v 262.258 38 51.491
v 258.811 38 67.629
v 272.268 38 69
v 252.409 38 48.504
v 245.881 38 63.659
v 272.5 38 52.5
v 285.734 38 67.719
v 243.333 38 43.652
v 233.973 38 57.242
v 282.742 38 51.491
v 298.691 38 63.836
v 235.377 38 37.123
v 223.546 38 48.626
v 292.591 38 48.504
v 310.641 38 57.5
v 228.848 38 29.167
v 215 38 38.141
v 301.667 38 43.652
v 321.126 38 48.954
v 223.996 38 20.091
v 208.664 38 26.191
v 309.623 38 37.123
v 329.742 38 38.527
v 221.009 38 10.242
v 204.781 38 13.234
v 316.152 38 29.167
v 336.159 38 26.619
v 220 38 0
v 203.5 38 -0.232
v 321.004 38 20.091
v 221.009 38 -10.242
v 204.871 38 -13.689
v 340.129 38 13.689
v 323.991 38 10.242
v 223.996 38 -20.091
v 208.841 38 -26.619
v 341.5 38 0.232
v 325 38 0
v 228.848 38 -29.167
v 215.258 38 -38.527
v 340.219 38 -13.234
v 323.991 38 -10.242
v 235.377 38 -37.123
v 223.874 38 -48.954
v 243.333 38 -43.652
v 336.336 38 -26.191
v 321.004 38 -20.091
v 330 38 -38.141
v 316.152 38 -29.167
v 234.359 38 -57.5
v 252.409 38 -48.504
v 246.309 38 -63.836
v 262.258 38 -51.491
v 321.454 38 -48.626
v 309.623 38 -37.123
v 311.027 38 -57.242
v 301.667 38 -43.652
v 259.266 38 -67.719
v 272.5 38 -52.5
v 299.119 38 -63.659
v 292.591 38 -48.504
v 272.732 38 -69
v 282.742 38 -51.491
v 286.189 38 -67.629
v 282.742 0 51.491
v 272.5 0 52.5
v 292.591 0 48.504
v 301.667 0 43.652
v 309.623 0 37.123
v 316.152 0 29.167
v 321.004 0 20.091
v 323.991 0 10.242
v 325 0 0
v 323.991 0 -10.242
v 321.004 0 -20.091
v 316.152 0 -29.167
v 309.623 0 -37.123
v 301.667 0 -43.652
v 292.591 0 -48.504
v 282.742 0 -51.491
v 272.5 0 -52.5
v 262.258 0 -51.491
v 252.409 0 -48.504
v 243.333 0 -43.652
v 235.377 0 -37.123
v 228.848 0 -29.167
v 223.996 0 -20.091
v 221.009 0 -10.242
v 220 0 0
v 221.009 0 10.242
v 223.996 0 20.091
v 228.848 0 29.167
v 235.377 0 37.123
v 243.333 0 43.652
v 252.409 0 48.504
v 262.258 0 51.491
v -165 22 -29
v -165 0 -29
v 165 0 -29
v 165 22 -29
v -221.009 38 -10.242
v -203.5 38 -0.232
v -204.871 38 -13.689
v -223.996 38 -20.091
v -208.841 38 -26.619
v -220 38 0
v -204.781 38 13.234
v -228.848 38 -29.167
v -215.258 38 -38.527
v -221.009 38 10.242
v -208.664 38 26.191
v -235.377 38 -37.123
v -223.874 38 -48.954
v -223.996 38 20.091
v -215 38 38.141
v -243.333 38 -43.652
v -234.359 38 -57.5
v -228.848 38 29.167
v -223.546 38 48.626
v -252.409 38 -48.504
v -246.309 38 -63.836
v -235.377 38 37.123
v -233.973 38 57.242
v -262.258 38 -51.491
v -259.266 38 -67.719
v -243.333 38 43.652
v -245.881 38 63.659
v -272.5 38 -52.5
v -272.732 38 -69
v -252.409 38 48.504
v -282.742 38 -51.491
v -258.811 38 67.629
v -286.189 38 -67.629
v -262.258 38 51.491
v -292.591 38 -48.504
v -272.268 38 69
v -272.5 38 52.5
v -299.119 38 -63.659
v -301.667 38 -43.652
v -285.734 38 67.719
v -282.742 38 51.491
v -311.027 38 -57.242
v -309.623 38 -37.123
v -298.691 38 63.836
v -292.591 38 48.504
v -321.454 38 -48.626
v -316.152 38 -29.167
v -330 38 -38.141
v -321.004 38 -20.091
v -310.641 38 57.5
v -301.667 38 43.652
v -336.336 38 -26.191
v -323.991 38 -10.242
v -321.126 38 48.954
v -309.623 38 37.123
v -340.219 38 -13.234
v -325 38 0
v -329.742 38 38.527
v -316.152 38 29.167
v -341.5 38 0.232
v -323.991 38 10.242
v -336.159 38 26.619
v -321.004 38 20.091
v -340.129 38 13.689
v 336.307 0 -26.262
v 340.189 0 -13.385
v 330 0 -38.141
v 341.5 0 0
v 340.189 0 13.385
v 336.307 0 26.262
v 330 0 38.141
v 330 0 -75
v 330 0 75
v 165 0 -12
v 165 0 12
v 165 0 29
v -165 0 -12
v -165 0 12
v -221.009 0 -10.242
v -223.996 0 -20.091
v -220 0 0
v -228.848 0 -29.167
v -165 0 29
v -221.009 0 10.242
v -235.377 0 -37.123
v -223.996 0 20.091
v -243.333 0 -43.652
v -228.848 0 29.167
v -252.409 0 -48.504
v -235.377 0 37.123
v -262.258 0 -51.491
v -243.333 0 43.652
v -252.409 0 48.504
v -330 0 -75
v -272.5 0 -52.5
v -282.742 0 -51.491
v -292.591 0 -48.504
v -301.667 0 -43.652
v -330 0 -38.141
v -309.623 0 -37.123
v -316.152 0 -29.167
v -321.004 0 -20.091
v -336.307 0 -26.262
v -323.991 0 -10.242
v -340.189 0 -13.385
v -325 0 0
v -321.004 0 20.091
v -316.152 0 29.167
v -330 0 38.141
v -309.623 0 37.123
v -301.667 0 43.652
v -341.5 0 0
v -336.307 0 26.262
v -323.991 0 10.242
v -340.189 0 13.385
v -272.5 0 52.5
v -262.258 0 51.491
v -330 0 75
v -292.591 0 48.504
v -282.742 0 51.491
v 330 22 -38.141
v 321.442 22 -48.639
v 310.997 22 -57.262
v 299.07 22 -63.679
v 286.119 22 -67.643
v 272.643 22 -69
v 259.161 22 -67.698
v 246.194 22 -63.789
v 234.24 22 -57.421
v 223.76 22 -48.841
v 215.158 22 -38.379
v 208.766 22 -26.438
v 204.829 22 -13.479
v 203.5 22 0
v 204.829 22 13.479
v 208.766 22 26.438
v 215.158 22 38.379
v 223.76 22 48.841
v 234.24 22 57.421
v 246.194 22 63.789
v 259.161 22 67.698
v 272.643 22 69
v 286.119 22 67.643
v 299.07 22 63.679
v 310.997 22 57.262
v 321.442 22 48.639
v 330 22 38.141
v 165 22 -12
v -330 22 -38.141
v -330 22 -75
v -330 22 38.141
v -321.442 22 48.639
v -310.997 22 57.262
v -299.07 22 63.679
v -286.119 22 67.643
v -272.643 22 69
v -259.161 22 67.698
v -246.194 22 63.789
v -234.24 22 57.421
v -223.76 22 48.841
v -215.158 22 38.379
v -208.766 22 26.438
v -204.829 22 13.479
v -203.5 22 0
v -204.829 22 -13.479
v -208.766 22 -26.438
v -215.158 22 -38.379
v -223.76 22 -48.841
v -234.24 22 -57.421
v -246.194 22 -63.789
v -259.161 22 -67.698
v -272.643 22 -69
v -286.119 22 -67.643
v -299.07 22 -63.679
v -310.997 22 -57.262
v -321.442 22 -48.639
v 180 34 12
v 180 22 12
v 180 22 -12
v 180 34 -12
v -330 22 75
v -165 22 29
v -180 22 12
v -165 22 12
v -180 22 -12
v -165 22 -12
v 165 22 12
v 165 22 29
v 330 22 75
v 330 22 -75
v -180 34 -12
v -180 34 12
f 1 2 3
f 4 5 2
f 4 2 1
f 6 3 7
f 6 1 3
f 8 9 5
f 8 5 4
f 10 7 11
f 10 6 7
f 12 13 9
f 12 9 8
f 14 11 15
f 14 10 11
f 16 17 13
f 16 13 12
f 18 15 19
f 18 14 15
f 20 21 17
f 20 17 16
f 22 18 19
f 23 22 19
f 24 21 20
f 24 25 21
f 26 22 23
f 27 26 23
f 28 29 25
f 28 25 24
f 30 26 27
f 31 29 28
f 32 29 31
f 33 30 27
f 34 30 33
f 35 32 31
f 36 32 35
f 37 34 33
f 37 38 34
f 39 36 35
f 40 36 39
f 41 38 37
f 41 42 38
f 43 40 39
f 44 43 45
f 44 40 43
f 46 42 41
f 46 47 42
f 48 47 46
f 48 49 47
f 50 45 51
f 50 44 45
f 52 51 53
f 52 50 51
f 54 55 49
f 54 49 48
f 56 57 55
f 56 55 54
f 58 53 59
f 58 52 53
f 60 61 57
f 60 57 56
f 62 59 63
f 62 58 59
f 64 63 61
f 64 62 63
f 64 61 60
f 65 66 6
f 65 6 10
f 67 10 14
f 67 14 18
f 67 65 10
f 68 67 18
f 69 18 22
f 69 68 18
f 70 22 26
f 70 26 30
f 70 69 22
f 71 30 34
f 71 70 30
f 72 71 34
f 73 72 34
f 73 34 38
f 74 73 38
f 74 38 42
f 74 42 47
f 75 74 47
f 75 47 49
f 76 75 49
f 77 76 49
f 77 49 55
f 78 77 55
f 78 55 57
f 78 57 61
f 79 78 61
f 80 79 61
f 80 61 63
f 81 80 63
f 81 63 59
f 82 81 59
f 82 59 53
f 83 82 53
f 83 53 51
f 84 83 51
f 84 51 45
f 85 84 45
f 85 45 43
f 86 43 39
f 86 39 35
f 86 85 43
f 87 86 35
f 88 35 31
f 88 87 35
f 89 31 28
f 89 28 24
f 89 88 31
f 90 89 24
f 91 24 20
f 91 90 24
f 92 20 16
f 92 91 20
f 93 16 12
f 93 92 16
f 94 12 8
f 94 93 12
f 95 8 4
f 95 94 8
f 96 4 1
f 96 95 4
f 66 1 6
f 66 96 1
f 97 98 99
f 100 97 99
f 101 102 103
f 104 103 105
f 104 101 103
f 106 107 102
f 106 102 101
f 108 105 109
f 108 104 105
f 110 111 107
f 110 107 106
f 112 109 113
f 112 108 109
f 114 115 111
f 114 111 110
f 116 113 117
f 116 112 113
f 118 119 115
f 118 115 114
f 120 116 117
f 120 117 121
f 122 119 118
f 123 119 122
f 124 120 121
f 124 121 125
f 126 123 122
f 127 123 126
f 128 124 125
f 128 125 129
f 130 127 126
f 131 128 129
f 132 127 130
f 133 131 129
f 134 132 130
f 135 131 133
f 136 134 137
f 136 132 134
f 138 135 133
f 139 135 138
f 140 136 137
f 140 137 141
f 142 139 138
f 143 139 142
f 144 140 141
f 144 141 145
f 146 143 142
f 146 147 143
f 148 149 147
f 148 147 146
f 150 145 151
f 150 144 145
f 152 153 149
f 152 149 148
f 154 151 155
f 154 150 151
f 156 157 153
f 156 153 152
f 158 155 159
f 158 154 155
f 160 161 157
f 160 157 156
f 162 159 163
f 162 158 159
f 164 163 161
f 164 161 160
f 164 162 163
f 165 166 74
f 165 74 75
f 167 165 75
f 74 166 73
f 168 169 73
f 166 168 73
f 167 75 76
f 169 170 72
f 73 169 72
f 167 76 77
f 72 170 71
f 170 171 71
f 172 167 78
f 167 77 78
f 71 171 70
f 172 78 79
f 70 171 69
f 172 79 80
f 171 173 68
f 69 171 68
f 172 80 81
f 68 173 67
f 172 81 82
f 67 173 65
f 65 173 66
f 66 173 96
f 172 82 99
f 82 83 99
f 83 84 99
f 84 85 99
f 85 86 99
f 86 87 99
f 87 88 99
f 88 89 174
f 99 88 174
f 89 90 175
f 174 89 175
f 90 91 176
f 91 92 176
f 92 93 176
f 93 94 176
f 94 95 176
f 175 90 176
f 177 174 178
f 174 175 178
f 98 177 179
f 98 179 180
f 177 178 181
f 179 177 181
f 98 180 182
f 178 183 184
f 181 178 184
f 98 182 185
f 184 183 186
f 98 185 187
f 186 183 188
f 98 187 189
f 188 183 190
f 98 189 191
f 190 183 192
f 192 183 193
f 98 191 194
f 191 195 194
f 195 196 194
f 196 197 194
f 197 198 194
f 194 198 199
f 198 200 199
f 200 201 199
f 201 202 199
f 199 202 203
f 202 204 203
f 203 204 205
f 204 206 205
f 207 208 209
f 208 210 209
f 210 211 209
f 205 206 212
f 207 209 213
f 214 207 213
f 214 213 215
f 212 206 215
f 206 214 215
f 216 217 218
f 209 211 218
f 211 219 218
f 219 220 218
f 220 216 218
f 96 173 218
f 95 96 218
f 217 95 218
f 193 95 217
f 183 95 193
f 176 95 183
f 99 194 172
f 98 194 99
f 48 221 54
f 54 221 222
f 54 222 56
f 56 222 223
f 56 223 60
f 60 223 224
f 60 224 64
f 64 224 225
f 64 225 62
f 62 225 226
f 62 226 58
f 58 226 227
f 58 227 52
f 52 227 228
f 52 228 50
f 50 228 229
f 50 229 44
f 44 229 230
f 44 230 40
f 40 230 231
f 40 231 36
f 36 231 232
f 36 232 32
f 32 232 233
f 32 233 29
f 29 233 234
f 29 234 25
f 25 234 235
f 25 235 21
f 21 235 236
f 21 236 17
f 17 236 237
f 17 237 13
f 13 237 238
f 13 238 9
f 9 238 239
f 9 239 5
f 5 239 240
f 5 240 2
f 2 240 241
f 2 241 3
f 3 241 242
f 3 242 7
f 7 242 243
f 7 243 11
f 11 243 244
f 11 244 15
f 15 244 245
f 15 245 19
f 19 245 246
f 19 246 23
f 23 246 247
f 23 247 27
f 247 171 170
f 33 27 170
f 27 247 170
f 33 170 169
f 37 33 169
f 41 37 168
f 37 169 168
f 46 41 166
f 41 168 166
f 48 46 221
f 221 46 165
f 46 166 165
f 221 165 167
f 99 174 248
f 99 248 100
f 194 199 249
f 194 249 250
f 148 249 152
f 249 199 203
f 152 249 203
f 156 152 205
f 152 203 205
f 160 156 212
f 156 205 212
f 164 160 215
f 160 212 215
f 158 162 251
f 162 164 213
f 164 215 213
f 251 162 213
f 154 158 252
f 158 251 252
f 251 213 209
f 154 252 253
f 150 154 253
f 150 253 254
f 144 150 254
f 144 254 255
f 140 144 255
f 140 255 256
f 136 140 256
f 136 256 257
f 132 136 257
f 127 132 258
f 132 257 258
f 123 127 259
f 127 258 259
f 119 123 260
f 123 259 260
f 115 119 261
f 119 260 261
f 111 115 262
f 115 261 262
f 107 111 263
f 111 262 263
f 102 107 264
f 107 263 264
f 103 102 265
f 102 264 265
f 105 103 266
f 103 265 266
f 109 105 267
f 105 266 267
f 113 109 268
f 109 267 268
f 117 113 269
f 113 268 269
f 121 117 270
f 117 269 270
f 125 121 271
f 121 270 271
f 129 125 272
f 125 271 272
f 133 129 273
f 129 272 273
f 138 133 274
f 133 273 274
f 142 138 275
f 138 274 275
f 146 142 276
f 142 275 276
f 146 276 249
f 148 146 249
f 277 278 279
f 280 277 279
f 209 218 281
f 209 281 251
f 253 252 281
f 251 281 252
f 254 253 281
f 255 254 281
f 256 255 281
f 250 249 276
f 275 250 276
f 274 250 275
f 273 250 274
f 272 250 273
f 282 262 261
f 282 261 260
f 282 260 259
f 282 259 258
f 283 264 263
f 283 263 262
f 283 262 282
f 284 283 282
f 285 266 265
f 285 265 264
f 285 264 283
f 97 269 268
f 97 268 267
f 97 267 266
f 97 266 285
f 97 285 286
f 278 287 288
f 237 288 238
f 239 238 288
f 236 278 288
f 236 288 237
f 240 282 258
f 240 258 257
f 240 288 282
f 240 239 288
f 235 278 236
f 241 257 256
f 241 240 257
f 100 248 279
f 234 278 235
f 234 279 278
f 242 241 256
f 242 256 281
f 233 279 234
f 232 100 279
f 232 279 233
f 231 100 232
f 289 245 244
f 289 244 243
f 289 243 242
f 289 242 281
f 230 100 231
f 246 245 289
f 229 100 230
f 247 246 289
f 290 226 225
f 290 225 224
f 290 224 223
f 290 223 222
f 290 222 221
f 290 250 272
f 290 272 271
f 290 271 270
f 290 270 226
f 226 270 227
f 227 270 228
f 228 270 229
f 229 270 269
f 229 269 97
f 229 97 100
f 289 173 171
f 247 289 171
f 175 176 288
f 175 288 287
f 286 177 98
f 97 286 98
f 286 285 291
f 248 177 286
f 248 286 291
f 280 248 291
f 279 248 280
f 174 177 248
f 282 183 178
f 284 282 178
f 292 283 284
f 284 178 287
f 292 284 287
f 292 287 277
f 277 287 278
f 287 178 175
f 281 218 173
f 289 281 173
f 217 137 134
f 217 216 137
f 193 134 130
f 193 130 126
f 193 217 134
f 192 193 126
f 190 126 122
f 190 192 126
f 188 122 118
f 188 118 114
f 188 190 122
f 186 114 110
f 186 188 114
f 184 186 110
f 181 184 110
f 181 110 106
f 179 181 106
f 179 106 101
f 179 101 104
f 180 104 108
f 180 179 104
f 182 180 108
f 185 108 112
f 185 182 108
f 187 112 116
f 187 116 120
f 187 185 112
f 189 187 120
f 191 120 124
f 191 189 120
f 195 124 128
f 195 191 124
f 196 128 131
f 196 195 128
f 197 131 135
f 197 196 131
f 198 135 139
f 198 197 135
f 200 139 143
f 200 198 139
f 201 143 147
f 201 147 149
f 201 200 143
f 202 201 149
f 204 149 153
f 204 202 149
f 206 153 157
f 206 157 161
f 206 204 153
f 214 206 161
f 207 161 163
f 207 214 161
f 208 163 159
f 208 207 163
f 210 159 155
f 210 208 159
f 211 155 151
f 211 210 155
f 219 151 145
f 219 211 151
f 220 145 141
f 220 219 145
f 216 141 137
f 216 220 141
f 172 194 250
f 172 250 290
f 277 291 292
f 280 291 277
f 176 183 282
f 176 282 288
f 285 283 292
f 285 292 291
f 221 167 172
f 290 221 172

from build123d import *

# Parameters (mm, degrees)
F_01_LINK_PROFILE_W            = 660
F_01_LINK_PROFILE_H            = 150
F_01_LINK_PROFILE_R            = 52.5
F_01_LINK_PROFILE_W_2          = 330
F_01_LINK_PROFILE_H_2          = 58
F_01_LINK_PLATE_DEPTH          = 22
F_02_END_BOSS_PROFILES_R       = 69
F_02_END_BOSS_PROFILES_R_2     = 52.5
F_02_BEARING_SEAT_BOSSES_DEPTH = 38
F_03_CENTER_RIB_PROFILE_W      = 360
F_03_CENTER_RIB_PROFILE_H      = 24
F_03_CENTER_RIB_DEPTH          = 34


with BuildPart() as part:
    # 01_Link_Profile → 01_Link_Plate (new body)
    with BuildSketch(Plane(origin=(0, 0, 0), x_dir=(1, 0, 0), z_dir=(0, 1, 0))):
        Rectangle(F_01_LINK_PROFILE_W, F_01_LINK_PROFILE_H)
        with Locations(Location((-272.5, 0, 0), (0, 0, 270))):
            Circle(F_01_LINK_PROFILE_R, mode=Mode.SUBTRACT)
        with Locations(Location((272.5, 0, 0), (0, 0, 270))):
            Circle(F_01_LINK_PROFILE_R, mode=Mode.SUBTRACT)
        Rectangle(F_01_LINK_PROFILE_W_2, F_01_LINK_PROFILE_H_2, mode=Mode.SUBTRACT)
    extrude(amount=F_01_LINK_PLATE_DEPTH)

    # 02_End_Boss_Profiles → 02_Bearing_Seat_Bosses (add)
    # profile 1 of 2: a face of its own
    with BuildSketch(Plane(origin=(0, 0, 0), x_dir=(1, 0, 0), z_dir=(0, 1, 0))):
        with Locations(Location((-272.5, 0, 0), (0, 0, 146.442690238))):
            Circle(F_02_END_BOSS_PROFILES_R)
        with Locations(Location((-272.5, 0, 0), (0, 0, 270))):
            Circle(F_02_END_BOSS_PROFILES_R_2, mode=Mode.SUBTRACT)
    # profile 2 of 2: a face of its own
    with BuildSketch(Plane(origin=(0, 0, 0), x_dir=(1, 0, 0), z_dir=(0, 1, 0))):
        with Locations(Location((272.5, 0, 0), (0, 0, 33.557309762))):
            Circle(F_02_END_BOSS_PROFILES_R)
        with Locations(Location((272.5, 0, 0), (0, 0, 270))):
            Circle(F_02_END_BOSS_PROFILES_R_2, mode=Mode.SUBTRACT)
    extrude(amount=F_02_BEARING_SEAT_BOSSES_DEPTH)

    # 03_Center_Rib_Profile → 03_Center_Rib (add)
    with BuildSketch(Plane(origin=(0, 0, 0), x_dir=(1, 0, 0), z_dir=(0, 1, 0))):
        Rectangle(F_03_CENTER_RIB_PROFILE_W, F_03_CENTER_RIB_PROFILE_H)
    extrude(amount=F_03_CENTER_RIB_DEPTH)


solid = part.part
